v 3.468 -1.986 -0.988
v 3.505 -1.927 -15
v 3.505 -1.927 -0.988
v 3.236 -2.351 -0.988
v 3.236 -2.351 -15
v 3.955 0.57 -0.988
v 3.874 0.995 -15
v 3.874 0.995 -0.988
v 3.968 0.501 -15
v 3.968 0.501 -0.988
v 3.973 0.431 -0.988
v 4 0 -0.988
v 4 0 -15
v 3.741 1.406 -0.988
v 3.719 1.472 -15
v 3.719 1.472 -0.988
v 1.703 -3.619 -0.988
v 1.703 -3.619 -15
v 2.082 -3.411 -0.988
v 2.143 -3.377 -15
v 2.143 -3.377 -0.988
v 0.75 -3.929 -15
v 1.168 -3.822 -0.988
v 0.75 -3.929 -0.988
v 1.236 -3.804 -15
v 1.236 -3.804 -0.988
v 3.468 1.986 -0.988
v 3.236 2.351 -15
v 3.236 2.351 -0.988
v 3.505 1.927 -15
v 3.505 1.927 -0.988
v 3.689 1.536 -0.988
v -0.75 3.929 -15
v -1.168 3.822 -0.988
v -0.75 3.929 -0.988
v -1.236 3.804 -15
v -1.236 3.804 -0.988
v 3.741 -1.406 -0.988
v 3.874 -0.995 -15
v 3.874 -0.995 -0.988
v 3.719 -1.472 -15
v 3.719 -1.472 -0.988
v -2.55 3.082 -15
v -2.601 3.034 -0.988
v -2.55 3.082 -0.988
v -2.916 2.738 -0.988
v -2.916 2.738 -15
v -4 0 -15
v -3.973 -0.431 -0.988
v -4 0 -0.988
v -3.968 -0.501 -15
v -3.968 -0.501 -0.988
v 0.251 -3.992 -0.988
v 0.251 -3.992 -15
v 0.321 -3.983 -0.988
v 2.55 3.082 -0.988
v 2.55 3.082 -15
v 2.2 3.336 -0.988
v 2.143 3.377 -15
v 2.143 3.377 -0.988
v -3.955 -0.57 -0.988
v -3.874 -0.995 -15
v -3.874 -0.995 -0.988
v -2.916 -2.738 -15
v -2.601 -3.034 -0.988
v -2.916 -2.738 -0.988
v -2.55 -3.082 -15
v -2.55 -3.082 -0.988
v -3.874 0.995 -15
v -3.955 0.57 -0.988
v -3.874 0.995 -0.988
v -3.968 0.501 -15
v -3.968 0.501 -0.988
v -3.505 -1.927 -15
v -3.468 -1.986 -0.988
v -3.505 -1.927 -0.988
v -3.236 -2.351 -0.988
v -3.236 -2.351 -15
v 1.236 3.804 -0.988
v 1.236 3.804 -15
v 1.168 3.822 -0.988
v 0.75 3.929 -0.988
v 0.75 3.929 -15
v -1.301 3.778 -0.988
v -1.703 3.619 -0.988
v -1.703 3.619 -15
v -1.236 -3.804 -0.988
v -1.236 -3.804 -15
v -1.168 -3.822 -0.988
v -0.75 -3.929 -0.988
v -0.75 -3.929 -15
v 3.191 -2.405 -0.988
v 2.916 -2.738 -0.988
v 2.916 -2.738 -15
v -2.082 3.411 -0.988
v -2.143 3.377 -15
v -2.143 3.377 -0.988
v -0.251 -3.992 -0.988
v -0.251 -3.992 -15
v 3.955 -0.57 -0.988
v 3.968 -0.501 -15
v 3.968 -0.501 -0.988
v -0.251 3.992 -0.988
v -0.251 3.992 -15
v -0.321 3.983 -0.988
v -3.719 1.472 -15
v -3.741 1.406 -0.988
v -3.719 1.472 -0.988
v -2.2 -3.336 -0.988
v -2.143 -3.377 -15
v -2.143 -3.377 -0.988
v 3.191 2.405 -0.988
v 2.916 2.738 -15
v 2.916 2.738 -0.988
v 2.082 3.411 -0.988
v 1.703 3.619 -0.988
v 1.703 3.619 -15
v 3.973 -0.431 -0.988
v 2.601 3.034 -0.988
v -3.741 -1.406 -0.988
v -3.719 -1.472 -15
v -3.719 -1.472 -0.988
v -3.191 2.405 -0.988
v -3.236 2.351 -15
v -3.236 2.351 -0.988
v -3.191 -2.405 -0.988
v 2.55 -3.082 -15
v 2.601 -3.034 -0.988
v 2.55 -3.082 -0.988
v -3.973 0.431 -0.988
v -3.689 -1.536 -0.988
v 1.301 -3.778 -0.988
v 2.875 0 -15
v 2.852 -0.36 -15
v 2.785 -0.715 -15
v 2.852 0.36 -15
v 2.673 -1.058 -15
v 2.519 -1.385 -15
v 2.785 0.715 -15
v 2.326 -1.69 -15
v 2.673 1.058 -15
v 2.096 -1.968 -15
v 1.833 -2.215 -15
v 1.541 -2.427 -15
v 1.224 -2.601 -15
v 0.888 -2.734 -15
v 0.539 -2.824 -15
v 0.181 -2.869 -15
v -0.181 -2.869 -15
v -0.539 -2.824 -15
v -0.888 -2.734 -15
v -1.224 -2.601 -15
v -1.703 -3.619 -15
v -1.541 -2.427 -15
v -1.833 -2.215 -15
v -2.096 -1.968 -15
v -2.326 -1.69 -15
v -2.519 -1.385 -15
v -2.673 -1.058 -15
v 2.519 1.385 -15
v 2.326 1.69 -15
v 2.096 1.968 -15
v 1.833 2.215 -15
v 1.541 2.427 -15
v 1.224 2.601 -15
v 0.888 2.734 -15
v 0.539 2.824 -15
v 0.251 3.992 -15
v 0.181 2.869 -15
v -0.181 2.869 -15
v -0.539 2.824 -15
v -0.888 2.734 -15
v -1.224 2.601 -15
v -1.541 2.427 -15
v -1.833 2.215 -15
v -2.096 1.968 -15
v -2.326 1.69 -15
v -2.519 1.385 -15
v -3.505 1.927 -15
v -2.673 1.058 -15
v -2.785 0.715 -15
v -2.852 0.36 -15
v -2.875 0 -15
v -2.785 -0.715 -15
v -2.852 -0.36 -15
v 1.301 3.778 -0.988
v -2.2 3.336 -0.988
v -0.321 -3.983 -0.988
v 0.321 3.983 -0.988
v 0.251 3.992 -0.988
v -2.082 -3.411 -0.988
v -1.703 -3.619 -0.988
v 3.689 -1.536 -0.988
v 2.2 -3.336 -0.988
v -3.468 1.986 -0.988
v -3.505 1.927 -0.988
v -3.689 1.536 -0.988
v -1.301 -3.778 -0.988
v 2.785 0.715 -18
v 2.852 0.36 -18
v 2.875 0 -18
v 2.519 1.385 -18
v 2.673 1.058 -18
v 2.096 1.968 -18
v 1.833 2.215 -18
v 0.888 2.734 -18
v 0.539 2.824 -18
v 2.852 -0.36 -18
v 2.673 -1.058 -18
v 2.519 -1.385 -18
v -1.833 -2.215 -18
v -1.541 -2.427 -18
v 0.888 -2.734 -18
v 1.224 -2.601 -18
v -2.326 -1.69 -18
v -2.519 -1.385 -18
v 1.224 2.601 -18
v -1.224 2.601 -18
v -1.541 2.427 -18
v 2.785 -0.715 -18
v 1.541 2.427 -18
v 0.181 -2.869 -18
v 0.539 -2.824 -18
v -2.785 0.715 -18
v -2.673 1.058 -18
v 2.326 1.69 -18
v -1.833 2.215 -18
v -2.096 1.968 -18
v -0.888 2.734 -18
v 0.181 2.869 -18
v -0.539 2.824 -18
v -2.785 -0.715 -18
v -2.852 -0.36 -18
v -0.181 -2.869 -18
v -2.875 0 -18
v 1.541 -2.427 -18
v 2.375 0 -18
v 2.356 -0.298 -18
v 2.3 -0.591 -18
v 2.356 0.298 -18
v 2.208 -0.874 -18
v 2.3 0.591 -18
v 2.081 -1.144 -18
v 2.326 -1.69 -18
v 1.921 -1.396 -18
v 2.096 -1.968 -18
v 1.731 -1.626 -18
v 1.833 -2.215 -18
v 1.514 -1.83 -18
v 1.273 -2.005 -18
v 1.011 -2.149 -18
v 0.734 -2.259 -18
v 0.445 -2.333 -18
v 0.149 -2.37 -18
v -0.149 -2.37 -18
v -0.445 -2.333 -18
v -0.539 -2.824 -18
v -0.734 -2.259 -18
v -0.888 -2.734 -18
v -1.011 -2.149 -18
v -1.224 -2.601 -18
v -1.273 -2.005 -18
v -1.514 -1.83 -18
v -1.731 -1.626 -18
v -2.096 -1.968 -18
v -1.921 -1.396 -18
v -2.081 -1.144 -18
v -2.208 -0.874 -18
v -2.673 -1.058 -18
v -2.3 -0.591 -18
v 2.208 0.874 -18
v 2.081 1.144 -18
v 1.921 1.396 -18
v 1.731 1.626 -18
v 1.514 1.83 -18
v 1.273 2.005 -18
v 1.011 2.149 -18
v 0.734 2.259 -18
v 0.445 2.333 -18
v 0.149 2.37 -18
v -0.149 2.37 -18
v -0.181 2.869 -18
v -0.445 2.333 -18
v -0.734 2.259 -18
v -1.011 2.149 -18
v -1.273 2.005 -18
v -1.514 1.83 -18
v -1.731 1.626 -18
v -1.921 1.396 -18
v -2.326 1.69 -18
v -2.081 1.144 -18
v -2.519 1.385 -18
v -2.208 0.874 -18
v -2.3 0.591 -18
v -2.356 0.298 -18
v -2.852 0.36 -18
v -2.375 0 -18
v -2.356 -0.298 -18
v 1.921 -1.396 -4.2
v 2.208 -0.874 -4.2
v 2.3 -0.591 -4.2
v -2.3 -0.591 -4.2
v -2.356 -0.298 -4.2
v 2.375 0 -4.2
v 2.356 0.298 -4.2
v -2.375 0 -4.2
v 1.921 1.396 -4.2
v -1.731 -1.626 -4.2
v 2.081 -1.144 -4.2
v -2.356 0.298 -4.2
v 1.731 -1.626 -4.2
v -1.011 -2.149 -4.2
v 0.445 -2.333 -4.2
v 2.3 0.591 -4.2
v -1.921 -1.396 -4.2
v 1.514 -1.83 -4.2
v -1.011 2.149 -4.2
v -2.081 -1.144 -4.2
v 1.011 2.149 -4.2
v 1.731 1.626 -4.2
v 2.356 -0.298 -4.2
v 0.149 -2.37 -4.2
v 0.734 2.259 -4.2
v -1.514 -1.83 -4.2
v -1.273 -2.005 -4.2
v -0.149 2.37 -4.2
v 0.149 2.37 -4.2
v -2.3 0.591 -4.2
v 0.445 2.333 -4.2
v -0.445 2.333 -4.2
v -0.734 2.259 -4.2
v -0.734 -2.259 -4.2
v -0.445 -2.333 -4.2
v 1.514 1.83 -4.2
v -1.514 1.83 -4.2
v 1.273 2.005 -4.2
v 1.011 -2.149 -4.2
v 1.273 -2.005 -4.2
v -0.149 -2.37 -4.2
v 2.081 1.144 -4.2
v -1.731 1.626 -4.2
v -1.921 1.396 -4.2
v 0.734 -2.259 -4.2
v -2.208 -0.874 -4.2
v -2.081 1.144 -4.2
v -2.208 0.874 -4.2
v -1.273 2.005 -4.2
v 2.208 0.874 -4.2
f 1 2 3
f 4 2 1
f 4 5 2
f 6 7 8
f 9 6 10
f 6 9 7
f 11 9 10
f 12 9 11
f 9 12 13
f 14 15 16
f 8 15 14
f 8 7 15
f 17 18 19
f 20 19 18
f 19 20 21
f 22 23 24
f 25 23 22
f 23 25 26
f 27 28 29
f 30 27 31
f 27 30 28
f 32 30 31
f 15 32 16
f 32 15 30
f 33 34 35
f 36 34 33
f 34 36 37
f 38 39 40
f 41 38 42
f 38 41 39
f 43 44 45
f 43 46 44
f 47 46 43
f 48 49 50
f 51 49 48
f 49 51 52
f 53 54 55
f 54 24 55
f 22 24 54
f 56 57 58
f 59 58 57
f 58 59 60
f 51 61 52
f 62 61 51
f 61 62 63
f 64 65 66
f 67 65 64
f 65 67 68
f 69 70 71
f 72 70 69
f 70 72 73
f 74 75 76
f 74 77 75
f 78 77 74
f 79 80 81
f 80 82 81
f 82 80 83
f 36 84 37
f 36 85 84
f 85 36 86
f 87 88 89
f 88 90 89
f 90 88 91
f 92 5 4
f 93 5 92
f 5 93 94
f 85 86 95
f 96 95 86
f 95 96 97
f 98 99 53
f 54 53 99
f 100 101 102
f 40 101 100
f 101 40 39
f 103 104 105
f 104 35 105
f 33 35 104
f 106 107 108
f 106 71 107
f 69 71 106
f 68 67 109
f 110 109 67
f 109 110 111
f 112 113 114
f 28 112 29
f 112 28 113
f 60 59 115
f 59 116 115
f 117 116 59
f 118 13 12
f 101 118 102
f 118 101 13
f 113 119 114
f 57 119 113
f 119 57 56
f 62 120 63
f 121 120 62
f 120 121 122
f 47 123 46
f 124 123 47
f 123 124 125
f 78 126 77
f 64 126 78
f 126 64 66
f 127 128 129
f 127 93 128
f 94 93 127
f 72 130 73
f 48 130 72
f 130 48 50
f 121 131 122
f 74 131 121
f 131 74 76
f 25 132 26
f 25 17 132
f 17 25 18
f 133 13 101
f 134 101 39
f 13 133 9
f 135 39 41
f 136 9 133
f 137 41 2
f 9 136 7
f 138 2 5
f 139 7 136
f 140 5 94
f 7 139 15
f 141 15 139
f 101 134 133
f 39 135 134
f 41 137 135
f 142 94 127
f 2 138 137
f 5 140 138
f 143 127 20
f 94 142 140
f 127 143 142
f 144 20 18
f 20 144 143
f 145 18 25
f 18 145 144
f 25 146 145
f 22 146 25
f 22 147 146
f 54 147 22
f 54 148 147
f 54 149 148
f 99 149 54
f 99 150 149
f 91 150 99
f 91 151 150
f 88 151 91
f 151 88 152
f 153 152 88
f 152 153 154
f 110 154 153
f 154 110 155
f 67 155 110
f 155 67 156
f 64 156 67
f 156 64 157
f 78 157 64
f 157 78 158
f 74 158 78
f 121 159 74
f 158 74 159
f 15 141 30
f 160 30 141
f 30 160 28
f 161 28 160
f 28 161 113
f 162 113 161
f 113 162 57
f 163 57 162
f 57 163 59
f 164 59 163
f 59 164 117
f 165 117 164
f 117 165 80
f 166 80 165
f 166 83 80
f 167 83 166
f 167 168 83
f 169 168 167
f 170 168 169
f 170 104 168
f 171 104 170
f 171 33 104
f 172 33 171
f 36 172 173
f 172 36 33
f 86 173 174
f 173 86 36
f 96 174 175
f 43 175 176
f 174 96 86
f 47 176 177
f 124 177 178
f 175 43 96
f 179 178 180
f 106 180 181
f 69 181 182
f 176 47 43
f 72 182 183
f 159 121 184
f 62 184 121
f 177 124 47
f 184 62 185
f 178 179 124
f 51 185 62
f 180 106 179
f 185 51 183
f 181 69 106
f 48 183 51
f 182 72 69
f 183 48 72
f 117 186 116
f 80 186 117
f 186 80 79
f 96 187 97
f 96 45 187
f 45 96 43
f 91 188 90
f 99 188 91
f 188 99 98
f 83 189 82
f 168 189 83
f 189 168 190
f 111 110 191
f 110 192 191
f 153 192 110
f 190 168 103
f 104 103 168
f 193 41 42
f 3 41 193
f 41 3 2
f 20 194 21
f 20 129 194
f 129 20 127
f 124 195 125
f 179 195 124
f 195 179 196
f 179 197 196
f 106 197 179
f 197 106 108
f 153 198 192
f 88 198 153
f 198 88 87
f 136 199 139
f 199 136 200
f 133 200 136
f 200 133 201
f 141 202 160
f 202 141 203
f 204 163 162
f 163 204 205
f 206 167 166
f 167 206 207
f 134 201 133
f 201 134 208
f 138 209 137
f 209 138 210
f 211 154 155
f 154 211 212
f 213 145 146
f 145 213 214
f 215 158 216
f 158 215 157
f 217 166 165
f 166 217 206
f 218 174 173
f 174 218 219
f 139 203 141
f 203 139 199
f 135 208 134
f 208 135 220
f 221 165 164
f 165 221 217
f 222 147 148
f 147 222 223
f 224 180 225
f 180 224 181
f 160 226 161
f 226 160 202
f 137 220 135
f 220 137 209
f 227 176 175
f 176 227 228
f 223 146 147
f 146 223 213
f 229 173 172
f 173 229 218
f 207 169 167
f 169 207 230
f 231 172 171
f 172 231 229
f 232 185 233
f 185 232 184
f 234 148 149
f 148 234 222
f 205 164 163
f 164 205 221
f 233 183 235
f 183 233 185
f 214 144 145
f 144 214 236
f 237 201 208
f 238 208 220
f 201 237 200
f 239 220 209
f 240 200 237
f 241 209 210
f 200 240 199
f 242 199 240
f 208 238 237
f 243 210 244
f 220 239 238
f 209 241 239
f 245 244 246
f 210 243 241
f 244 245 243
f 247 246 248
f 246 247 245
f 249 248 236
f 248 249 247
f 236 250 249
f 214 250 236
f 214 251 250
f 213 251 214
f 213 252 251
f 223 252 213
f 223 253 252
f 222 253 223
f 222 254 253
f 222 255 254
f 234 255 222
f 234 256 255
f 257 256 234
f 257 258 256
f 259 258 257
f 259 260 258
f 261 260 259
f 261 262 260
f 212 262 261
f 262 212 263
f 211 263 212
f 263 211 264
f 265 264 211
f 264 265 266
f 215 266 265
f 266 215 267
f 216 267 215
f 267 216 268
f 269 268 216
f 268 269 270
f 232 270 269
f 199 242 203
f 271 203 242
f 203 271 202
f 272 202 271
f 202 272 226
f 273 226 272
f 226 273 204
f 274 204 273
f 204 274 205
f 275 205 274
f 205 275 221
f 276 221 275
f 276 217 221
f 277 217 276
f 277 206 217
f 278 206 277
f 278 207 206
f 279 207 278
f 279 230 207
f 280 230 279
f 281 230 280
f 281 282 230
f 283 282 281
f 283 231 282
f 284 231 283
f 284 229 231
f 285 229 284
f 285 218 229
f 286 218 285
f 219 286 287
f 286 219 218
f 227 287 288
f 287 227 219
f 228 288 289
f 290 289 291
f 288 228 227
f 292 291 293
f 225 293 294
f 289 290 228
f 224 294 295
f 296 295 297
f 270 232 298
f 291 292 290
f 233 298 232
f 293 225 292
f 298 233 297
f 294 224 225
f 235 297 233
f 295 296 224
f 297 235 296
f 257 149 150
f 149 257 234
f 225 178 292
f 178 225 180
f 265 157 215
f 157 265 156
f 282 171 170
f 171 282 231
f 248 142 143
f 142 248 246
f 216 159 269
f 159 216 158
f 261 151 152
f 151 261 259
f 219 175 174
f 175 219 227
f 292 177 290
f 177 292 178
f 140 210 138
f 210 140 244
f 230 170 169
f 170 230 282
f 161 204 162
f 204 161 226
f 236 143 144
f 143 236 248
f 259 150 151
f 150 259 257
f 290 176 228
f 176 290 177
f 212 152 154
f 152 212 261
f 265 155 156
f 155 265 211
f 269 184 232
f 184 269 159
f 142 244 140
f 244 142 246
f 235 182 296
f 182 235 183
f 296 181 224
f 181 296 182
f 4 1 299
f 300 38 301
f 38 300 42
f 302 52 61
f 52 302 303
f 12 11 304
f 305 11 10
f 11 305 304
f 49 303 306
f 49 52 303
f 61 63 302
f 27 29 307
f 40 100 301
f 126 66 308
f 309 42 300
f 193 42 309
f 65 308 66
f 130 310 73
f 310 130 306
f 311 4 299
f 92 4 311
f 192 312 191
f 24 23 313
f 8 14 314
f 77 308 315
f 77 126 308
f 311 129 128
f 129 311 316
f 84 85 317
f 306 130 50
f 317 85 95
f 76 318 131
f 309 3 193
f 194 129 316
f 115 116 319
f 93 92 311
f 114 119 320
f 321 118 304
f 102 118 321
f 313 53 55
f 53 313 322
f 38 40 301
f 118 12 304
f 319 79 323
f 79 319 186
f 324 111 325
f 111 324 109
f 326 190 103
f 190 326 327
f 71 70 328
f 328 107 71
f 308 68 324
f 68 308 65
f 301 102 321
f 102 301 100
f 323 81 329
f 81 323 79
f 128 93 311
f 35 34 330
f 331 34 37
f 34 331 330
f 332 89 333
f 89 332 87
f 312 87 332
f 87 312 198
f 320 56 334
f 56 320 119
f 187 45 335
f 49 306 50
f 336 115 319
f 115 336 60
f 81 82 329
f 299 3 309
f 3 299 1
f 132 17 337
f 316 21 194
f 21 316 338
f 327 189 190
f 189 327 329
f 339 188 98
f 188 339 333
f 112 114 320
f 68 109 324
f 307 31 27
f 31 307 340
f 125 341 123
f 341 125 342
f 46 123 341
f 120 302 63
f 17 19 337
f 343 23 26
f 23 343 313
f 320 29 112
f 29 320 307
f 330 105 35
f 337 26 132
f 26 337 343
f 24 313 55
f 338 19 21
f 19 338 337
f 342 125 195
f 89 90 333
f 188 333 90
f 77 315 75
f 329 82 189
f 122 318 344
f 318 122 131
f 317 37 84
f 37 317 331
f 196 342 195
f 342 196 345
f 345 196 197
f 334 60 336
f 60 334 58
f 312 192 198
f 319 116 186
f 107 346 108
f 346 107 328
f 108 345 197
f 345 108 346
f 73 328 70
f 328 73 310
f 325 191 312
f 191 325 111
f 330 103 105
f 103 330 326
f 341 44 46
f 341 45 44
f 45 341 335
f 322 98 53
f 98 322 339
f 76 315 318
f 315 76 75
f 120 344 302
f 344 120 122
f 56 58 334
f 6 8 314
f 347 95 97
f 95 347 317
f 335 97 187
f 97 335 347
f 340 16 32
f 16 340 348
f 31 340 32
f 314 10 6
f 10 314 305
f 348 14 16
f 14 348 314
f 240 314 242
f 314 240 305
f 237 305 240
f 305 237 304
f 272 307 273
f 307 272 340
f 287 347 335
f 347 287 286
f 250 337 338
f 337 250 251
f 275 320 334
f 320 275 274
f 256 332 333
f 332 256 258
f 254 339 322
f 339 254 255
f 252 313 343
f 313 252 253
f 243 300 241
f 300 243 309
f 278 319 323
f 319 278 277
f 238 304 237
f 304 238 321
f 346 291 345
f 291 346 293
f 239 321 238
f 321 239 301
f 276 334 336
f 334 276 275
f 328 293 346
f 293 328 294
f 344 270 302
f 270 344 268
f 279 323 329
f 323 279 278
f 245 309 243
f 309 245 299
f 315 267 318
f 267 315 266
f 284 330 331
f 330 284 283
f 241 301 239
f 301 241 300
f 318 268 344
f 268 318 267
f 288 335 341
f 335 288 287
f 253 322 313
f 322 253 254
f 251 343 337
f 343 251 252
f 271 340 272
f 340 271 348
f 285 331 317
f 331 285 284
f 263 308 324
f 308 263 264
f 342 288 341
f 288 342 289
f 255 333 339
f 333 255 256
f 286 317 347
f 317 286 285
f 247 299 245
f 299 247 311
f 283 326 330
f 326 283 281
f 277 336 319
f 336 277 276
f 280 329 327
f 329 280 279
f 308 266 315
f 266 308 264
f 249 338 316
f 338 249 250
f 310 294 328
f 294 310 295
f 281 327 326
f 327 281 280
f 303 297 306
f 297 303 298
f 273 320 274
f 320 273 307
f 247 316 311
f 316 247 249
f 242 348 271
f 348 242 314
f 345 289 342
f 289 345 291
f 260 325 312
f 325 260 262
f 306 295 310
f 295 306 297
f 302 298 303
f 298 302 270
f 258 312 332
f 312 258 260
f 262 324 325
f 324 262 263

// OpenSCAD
$fn = 50;

difference() {
	union() {
		translate(v = [0, 0, -15.0]) {
			cylinder(h = 18, r = 4.0);
		}
		#translate(v = [0, 0, -18.0]) {
			cylinder(h = 18, r = 2.875);
		}
	}
	union() {
		translate(v = [0, 0, 0]) {
			rotate(a = [0, 0, 0]) {
				difference() {
					union() {
						translate(v = [0, 0, -18.0]) {
							cylinder(h = 18, r = 2.25);
						}
						translate(v = [0, 0, -4.2]) {
							cylinder(h = 4.2, r1 = 2.375, r2 = 4.5);
						}
						translate(v = [0, 0, -18.0]) {
							cylinder(h = 18, r = 2.375);
						}
						translate(v = [0, 0, -18.0]) {
							cylinder(h = 18, r = 2.25);
						}
					}
					union();
				}
			}
		}
		#cylinder(h = 3, r = 5.0);
	}
}
